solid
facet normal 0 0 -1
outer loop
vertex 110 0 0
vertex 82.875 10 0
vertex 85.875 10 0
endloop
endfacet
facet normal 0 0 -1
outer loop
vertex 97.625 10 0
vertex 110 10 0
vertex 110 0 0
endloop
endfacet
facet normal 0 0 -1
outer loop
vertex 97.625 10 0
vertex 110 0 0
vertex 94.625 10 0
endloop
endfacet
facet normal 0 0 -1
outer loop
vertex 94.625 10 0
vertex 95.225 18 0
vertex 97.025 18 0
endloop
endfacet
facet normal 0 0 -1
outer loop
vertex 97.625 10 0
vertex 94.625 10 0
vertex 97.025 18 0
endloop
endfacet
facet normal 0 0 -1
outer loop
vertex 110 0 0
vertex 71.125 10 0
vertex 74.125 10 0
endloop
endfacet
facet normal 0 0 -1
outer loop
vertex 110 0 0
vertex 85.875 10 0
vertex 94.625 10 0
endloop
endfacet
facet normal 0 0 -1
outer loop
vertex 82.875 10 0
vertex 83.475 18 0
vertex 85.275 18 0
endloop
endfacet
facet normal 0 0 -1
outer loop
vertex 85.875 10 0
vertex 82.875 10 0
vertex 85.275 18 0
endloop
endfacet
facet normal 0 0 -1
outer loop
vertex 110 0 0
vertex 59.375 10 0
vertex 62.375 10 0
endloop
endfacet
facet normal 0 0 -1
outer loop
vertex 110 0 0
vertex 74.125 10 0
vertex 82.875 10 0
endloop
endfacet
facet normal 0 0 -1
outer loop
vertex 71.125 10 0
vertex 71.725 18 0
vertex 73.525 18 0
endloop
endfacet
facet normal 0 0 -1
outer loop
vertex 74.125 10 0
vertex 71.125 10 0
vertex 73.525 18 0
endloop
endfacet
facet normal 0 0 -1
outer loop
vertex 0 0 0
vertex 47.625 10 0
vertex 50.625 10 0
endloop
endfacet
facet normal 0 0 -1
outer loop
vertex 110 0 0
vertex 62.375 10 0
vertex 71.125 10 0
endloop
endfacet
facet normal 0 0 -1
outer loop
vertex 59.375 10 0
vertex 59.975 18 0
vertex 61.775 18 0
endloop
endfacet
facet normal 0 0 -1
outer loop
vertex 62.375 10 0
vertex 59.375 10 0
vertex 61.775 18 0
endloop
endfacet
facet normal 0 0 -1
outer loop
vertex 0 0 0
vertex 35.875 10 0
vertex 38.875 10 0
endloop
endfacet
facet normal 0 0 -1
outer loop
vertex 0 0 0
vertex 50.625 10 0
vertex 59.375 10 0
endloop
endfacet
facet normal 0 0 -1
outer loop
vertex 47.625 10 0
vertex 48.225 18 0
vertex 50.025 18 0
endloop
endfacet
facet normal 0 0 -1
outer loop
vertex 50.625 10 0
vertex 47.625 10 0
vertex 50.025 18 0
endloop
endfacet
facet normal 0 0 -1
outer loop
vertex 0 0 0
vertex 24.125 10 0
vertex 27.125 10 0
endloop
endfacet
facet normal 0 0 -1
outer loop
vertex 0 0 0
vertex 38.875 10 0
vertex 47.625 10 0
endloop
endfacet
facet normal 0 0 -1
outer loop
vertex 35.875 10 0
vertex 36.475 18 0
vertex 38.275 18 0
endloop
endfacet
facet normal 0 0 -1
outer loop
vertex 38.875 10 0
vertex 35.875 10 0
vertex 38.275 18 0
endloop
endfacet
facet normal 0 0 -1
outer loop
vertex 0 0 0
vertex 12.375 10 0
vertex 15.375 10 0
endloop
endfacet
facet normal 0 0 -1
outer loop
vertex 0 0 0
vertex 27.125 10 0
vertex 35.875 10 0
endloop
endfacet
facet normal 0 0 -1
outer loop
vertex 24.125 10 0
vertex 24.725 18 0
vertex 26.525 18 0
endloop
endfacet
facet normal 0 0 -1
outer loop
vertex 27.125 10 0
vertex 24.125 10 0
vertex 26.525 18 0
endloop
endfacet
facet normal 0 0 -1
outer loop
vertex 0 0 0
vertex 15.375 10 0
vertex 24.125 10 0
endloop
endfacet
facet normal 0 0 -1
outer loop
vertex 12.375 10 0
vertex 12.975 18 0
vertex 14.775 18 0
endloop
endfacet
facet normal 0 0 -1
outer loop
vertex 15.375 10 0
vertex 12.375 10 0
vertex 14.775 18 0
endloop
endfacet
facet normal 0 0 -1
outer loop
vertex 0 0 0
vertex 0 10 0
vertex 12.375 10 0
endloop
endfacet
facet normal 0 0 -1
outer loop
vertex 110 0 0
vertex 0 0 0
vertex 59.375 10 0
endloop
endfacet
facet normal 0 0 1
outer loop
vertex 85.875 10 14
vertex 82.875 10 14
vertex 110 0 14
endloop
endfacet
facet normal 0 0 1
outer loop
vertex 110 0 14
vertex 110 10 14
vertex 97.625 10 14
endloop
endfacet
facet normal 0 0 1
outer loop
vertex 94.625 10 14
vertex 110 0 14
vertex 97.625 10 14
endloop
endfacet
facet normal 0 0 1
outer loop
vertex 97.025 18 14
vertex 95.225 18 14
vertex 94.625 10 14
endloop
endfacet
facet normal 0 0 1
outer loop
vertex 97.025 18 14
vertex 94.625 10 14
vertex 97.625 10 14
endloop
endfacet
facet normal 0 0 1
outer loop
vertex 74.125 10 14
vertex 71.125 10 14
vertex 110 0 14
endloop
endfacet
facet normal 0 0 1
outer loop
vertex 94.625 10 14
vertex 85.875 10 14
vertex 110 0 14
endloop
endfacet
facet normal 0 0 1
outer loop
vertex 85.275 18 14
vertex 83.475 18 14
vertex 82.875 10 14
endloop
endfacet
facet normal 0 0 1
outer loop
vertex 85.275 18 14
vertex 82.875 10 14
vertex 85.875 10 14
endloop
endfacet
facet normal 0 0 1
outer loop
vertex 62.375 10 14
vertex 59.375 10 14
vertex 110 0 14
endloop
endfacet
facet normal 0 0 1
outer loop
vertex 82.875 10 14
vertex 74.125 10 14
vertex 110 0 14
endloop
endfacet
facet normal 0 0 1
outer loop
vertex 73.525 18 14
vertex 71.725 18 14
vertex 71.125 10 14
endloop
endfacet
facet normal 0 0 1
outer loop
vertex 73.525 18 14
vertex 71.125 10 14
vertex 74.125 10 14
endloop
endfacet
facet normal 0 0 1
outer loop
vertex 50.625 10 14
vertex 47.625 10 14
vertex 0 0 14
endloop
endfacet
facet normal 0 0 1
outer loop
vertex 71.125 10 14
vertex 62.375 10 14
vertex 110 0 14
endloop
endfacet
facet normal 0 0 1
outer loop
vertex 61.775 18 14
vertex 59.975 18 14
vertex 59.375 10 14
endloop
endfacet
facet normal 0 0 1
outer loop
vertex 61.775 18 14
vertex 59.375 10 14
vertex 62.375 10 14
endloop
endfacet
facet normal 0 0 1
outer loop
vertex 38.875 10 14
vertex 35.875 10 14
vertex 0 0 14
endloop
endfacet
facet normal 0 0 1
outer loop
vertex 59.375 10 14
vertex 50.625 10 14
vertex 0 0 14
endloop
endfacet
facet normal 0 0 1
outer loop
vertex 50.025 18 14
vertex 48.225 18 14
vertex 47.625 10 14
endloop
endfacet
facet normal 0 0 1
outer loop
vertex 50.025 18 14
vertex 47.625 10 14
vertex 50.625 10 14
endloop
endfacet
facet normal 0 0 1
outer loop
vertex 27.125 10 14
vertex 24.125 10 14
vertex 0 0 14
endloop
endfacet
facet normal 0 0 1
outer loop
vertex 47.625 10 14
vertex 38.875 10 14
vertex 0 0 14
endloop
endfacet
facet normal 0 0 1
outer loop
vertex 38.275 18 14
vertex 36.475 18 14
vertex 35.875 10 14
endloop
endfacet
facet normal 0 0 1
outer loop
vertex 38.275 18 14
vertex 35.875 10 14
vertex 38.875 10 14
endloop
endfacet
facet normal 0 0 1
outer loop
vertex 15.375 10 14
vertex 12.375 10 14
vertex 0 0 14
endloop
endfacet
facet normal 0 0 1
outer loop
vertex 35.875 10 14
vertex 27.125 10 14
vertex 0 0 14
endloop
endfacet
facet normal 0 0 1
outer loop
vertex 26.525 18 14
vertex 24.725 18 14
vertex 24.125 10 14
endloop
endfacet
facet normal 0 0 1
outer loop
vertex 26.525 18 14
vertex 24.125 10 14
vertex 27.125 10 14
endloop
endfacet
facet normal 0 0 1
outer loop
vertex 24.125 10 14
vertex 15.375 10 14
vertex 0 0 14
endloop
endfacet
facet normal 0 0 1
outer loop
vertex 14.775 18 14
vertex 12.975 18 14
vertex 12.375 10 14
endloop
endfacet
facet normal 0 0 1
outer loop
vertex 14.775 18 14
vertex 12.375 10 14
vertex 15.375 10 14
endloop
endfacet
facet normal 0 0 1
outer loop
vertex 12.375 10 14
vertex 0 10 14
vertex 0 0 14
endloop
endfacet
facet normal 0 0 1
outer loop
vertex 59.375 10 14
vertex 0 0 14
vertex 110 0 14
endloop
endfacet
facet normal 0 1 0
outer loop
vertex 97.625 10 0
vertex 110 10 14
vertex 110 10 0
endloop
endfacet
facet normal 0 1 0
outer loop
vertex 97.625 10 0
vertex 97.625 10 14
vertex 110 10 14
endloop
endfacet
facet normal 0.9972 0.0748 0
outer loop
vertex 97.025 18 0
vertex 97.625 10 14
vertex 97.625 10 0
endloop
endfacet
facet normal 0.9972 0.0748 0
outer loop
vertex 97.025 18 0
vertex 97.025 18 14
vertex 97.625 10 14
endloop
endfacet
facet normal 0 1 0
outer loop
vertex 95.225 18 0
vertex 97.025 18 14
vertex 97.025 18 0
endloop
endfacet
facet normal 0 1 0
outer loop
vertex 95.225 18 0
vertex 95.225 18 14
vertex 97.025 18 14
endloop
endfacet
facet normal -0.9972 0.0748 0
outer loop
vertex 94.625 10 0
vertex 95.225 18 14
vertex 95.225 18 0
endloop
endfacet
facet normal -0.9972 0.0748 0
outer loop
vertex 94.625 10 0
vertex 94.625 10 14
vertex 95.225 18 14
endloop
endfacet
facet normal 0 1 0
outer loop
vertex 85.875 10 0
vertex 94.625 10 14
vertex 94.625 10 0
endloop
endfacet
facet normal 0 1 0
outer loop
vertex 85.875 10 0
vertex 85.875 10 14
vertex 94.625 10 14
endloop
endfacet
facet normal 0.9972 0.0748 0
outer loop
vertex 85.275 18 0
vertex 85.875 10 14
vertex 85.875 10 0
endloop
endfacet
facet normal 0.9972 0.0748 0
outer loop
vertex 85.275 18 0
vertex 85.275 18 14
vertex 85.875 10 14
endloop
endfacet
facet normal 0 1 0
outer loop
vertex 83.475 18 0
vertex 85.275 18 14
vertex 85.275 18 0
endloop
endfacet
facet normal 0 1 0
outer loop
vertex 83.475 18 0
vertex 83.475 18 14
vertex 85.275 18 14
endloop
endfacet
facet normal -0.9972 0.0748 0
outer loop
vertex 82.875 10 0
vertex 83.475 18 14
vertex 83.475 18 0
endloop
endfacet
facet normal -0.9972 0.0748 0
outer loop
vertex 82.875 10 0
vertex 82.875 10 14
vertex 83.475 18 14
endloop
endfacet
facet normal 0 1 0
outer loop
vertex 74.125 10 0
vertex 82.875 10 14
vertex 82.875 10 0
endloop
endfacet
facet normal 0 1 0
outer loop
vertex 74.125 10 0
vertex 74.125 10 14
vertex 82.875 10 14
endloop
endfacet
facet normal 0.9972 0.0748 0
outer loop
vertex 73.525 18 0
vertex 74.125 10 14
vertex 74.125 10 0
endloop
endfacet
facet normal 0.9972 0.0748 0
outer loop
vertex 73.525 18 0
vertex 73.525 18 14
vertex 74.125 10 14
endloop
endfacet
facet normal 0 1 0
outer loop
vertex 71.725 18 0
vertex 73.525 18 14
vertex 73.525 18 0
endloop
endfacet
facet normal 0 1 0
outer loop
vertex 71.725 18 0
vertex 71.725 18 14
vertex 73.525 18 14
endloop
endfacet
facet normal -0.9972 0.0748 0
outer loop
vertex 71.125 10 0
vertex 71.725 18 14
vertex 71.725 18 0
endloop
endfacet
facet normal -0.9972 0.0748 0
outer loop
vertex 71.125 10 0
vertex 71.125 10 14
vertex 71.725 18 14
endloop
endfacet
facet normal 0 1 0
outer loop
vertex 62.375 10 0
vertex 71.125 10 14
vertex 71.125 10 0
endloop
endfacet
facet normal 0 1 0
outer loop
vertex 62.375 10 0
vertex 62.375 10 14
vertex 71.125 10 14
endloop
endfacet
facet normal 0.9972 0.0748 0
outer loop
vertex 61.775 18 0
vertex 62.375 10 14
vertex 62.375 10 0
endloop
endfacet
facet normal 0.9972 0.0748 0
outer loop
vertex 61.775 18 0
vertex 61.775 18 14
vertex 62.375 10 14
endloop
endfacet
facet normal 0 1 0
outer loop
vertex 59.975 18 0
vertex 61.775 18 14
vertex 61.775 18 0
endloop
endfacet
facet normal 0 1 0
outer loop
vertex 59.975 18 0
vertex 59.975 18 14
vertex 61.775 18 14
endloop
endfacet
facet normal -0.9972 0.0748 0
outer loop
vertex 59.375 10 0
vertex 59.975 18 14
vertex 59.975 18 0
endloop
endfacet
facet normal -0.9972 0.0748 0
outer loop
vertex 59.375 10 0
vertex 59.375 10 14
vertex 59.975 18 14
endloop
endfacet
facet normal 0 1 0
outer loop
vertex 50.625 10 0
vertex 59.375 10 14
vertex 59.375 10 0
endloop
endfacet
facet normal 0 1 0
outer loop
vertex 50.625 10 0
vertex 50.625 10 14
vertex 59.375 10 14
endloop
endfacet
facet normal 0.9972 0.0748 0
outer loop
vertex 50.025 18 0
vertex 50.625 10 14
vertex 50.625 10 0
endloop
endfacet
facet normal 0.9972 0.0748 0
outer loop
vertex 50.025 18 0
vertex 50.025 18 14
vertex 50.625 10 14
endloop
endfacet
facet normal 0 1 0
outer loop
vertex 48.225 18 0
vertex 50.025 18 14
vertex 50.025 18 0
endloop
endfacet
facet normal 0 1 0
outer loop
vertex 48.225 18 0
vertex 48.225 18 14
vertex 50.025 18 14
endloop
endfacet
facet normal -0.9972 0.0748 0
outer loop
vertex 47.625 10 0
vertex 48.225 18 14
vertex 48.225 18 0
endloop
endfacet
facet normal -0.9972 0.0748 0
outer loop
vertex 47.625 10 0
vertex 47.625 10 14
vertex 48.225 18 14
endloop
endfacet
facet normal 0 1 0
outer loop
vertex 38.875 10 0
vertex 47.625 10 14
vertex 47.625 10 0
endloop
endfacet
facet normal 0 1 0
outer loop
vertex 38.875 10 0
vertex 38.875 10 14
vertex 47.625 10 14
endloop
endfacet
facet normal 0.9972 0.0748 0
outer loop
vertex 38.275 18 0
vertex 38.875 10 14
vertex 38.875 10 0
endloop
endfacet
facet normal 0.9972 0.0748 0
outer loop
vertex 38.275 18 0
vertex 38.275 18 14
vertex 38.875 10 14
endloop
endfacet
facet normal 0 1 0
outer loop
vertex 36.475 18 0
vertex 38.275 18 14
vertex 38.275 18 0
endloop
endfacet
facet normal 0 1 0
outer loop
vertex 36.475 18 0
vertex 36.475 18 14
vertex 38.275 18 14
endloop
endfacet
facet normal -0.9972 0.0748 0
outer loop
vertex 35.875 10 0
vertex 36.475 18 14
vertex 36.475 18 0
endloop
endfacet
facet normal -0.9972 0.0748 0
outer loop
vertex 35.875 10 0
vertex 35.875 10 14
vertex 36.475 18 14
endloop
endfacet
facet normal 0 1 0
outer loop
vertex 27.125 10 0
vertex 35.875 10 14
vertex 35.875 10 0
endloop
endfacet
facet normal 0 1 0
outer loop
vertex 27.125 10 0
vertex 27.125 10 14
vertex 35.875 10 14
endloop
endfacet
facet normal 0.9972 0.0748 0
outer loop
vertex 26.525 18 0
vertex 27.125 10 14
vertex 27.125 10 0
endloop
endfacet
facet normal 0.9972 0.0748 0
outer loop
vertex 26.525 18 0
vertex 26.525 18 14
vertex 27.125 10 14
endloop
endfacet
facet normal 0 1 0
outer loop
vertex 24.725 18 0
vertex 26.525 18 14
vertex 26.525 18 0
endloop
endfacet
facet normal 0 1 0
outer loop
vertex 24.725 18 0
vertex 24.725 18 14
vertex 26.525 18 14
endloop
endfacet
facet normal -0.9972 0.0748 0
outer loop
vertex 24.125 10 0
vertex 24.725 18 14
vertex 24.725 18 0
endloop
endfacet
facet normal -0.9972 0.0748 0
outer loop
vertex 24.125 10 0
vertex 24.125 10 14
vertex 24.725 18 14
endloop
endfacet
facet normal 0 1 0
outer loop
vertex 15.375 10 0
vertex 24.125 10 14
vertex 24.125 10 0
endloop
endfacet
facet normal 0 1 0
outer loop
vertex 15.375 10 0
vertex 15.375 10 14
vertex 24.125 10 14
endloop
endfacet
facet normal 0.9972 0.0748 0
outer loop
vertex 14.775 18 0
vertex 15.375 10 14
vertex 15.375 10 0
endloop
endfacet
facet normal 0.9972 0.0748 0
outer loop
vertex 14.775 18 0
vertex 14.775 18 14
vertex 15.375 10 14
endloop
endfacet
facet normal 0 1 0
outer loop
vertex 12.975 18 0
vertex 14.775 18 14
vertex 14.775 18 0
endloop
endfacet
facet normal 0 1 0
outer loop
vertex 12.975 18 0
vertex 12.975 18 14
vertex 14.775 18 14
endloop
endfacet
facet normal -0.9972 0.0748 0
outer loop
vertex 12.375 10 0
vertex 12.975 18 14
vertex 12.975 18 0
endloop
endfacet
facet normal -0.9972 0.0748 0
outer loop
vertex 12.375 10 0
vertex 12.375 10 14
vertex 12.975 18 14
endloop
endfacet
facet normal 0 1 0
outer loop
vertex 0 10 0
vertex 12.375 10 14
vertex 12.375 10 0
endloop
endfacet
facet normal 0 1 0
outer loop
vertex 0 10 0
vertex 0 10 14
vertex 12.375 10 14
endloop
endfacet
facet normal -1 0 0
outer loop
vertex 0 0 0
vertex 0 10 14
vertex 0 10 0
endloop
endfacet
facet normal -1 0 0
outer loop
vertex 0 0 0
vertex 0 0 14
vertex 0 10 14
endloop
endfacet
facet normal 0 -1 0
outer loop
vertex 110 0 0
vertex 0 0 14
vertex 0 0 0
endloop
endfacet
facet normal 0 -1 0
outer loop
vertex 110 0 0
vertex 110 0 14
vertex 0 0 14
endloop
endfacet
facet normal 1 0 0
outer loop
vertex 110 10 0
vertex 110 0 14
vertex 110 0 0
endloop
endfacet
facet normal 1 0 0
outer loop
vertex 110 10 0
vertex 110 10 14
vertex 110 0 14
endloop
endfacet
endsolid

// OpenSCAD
$fn = 32;
// ----------------------------------------------------------------------
// Gear rack: 8 teeth on a 110 mm bar, pitch 11.75 mm
// ----------------------------------------------------------------------

// --- parameters (mm) ---
profile_height = 14;      // extrusion height
profile_points = 36;      // points of the closed outline

profile = [[0, 0], [110, 0], [110, 10], [97.625, 10], [97.025, 18], [95.225, 18], [94.625, 10], [85.875, 10], [85.275, 18], [83.475, 18], [82.875, 10], [74.125, 10], [73.525, 18], [71.725, 18], [71.125, 10], [62.375, 10], [61.775, 18], [59.975, 18], [59.375, 10], [50.625, 10], [50.025, 18], [48.225, 18], [47.625, 10], [38.875, 10], [38.275, 18], [36.475, 18], [35.875, 10], [27.125, 10], [26.525, 18], [24.725, 18], [24.125, 10], [15.375, 10], [14.775, 18], [12.975, 18], [12.375, 10], [0, 10]];  // single closed polygon, 36 points, counter clockwise

// --- the one profile operation ---
linear_extrude(height = profile_height) polygon(points = profile);
